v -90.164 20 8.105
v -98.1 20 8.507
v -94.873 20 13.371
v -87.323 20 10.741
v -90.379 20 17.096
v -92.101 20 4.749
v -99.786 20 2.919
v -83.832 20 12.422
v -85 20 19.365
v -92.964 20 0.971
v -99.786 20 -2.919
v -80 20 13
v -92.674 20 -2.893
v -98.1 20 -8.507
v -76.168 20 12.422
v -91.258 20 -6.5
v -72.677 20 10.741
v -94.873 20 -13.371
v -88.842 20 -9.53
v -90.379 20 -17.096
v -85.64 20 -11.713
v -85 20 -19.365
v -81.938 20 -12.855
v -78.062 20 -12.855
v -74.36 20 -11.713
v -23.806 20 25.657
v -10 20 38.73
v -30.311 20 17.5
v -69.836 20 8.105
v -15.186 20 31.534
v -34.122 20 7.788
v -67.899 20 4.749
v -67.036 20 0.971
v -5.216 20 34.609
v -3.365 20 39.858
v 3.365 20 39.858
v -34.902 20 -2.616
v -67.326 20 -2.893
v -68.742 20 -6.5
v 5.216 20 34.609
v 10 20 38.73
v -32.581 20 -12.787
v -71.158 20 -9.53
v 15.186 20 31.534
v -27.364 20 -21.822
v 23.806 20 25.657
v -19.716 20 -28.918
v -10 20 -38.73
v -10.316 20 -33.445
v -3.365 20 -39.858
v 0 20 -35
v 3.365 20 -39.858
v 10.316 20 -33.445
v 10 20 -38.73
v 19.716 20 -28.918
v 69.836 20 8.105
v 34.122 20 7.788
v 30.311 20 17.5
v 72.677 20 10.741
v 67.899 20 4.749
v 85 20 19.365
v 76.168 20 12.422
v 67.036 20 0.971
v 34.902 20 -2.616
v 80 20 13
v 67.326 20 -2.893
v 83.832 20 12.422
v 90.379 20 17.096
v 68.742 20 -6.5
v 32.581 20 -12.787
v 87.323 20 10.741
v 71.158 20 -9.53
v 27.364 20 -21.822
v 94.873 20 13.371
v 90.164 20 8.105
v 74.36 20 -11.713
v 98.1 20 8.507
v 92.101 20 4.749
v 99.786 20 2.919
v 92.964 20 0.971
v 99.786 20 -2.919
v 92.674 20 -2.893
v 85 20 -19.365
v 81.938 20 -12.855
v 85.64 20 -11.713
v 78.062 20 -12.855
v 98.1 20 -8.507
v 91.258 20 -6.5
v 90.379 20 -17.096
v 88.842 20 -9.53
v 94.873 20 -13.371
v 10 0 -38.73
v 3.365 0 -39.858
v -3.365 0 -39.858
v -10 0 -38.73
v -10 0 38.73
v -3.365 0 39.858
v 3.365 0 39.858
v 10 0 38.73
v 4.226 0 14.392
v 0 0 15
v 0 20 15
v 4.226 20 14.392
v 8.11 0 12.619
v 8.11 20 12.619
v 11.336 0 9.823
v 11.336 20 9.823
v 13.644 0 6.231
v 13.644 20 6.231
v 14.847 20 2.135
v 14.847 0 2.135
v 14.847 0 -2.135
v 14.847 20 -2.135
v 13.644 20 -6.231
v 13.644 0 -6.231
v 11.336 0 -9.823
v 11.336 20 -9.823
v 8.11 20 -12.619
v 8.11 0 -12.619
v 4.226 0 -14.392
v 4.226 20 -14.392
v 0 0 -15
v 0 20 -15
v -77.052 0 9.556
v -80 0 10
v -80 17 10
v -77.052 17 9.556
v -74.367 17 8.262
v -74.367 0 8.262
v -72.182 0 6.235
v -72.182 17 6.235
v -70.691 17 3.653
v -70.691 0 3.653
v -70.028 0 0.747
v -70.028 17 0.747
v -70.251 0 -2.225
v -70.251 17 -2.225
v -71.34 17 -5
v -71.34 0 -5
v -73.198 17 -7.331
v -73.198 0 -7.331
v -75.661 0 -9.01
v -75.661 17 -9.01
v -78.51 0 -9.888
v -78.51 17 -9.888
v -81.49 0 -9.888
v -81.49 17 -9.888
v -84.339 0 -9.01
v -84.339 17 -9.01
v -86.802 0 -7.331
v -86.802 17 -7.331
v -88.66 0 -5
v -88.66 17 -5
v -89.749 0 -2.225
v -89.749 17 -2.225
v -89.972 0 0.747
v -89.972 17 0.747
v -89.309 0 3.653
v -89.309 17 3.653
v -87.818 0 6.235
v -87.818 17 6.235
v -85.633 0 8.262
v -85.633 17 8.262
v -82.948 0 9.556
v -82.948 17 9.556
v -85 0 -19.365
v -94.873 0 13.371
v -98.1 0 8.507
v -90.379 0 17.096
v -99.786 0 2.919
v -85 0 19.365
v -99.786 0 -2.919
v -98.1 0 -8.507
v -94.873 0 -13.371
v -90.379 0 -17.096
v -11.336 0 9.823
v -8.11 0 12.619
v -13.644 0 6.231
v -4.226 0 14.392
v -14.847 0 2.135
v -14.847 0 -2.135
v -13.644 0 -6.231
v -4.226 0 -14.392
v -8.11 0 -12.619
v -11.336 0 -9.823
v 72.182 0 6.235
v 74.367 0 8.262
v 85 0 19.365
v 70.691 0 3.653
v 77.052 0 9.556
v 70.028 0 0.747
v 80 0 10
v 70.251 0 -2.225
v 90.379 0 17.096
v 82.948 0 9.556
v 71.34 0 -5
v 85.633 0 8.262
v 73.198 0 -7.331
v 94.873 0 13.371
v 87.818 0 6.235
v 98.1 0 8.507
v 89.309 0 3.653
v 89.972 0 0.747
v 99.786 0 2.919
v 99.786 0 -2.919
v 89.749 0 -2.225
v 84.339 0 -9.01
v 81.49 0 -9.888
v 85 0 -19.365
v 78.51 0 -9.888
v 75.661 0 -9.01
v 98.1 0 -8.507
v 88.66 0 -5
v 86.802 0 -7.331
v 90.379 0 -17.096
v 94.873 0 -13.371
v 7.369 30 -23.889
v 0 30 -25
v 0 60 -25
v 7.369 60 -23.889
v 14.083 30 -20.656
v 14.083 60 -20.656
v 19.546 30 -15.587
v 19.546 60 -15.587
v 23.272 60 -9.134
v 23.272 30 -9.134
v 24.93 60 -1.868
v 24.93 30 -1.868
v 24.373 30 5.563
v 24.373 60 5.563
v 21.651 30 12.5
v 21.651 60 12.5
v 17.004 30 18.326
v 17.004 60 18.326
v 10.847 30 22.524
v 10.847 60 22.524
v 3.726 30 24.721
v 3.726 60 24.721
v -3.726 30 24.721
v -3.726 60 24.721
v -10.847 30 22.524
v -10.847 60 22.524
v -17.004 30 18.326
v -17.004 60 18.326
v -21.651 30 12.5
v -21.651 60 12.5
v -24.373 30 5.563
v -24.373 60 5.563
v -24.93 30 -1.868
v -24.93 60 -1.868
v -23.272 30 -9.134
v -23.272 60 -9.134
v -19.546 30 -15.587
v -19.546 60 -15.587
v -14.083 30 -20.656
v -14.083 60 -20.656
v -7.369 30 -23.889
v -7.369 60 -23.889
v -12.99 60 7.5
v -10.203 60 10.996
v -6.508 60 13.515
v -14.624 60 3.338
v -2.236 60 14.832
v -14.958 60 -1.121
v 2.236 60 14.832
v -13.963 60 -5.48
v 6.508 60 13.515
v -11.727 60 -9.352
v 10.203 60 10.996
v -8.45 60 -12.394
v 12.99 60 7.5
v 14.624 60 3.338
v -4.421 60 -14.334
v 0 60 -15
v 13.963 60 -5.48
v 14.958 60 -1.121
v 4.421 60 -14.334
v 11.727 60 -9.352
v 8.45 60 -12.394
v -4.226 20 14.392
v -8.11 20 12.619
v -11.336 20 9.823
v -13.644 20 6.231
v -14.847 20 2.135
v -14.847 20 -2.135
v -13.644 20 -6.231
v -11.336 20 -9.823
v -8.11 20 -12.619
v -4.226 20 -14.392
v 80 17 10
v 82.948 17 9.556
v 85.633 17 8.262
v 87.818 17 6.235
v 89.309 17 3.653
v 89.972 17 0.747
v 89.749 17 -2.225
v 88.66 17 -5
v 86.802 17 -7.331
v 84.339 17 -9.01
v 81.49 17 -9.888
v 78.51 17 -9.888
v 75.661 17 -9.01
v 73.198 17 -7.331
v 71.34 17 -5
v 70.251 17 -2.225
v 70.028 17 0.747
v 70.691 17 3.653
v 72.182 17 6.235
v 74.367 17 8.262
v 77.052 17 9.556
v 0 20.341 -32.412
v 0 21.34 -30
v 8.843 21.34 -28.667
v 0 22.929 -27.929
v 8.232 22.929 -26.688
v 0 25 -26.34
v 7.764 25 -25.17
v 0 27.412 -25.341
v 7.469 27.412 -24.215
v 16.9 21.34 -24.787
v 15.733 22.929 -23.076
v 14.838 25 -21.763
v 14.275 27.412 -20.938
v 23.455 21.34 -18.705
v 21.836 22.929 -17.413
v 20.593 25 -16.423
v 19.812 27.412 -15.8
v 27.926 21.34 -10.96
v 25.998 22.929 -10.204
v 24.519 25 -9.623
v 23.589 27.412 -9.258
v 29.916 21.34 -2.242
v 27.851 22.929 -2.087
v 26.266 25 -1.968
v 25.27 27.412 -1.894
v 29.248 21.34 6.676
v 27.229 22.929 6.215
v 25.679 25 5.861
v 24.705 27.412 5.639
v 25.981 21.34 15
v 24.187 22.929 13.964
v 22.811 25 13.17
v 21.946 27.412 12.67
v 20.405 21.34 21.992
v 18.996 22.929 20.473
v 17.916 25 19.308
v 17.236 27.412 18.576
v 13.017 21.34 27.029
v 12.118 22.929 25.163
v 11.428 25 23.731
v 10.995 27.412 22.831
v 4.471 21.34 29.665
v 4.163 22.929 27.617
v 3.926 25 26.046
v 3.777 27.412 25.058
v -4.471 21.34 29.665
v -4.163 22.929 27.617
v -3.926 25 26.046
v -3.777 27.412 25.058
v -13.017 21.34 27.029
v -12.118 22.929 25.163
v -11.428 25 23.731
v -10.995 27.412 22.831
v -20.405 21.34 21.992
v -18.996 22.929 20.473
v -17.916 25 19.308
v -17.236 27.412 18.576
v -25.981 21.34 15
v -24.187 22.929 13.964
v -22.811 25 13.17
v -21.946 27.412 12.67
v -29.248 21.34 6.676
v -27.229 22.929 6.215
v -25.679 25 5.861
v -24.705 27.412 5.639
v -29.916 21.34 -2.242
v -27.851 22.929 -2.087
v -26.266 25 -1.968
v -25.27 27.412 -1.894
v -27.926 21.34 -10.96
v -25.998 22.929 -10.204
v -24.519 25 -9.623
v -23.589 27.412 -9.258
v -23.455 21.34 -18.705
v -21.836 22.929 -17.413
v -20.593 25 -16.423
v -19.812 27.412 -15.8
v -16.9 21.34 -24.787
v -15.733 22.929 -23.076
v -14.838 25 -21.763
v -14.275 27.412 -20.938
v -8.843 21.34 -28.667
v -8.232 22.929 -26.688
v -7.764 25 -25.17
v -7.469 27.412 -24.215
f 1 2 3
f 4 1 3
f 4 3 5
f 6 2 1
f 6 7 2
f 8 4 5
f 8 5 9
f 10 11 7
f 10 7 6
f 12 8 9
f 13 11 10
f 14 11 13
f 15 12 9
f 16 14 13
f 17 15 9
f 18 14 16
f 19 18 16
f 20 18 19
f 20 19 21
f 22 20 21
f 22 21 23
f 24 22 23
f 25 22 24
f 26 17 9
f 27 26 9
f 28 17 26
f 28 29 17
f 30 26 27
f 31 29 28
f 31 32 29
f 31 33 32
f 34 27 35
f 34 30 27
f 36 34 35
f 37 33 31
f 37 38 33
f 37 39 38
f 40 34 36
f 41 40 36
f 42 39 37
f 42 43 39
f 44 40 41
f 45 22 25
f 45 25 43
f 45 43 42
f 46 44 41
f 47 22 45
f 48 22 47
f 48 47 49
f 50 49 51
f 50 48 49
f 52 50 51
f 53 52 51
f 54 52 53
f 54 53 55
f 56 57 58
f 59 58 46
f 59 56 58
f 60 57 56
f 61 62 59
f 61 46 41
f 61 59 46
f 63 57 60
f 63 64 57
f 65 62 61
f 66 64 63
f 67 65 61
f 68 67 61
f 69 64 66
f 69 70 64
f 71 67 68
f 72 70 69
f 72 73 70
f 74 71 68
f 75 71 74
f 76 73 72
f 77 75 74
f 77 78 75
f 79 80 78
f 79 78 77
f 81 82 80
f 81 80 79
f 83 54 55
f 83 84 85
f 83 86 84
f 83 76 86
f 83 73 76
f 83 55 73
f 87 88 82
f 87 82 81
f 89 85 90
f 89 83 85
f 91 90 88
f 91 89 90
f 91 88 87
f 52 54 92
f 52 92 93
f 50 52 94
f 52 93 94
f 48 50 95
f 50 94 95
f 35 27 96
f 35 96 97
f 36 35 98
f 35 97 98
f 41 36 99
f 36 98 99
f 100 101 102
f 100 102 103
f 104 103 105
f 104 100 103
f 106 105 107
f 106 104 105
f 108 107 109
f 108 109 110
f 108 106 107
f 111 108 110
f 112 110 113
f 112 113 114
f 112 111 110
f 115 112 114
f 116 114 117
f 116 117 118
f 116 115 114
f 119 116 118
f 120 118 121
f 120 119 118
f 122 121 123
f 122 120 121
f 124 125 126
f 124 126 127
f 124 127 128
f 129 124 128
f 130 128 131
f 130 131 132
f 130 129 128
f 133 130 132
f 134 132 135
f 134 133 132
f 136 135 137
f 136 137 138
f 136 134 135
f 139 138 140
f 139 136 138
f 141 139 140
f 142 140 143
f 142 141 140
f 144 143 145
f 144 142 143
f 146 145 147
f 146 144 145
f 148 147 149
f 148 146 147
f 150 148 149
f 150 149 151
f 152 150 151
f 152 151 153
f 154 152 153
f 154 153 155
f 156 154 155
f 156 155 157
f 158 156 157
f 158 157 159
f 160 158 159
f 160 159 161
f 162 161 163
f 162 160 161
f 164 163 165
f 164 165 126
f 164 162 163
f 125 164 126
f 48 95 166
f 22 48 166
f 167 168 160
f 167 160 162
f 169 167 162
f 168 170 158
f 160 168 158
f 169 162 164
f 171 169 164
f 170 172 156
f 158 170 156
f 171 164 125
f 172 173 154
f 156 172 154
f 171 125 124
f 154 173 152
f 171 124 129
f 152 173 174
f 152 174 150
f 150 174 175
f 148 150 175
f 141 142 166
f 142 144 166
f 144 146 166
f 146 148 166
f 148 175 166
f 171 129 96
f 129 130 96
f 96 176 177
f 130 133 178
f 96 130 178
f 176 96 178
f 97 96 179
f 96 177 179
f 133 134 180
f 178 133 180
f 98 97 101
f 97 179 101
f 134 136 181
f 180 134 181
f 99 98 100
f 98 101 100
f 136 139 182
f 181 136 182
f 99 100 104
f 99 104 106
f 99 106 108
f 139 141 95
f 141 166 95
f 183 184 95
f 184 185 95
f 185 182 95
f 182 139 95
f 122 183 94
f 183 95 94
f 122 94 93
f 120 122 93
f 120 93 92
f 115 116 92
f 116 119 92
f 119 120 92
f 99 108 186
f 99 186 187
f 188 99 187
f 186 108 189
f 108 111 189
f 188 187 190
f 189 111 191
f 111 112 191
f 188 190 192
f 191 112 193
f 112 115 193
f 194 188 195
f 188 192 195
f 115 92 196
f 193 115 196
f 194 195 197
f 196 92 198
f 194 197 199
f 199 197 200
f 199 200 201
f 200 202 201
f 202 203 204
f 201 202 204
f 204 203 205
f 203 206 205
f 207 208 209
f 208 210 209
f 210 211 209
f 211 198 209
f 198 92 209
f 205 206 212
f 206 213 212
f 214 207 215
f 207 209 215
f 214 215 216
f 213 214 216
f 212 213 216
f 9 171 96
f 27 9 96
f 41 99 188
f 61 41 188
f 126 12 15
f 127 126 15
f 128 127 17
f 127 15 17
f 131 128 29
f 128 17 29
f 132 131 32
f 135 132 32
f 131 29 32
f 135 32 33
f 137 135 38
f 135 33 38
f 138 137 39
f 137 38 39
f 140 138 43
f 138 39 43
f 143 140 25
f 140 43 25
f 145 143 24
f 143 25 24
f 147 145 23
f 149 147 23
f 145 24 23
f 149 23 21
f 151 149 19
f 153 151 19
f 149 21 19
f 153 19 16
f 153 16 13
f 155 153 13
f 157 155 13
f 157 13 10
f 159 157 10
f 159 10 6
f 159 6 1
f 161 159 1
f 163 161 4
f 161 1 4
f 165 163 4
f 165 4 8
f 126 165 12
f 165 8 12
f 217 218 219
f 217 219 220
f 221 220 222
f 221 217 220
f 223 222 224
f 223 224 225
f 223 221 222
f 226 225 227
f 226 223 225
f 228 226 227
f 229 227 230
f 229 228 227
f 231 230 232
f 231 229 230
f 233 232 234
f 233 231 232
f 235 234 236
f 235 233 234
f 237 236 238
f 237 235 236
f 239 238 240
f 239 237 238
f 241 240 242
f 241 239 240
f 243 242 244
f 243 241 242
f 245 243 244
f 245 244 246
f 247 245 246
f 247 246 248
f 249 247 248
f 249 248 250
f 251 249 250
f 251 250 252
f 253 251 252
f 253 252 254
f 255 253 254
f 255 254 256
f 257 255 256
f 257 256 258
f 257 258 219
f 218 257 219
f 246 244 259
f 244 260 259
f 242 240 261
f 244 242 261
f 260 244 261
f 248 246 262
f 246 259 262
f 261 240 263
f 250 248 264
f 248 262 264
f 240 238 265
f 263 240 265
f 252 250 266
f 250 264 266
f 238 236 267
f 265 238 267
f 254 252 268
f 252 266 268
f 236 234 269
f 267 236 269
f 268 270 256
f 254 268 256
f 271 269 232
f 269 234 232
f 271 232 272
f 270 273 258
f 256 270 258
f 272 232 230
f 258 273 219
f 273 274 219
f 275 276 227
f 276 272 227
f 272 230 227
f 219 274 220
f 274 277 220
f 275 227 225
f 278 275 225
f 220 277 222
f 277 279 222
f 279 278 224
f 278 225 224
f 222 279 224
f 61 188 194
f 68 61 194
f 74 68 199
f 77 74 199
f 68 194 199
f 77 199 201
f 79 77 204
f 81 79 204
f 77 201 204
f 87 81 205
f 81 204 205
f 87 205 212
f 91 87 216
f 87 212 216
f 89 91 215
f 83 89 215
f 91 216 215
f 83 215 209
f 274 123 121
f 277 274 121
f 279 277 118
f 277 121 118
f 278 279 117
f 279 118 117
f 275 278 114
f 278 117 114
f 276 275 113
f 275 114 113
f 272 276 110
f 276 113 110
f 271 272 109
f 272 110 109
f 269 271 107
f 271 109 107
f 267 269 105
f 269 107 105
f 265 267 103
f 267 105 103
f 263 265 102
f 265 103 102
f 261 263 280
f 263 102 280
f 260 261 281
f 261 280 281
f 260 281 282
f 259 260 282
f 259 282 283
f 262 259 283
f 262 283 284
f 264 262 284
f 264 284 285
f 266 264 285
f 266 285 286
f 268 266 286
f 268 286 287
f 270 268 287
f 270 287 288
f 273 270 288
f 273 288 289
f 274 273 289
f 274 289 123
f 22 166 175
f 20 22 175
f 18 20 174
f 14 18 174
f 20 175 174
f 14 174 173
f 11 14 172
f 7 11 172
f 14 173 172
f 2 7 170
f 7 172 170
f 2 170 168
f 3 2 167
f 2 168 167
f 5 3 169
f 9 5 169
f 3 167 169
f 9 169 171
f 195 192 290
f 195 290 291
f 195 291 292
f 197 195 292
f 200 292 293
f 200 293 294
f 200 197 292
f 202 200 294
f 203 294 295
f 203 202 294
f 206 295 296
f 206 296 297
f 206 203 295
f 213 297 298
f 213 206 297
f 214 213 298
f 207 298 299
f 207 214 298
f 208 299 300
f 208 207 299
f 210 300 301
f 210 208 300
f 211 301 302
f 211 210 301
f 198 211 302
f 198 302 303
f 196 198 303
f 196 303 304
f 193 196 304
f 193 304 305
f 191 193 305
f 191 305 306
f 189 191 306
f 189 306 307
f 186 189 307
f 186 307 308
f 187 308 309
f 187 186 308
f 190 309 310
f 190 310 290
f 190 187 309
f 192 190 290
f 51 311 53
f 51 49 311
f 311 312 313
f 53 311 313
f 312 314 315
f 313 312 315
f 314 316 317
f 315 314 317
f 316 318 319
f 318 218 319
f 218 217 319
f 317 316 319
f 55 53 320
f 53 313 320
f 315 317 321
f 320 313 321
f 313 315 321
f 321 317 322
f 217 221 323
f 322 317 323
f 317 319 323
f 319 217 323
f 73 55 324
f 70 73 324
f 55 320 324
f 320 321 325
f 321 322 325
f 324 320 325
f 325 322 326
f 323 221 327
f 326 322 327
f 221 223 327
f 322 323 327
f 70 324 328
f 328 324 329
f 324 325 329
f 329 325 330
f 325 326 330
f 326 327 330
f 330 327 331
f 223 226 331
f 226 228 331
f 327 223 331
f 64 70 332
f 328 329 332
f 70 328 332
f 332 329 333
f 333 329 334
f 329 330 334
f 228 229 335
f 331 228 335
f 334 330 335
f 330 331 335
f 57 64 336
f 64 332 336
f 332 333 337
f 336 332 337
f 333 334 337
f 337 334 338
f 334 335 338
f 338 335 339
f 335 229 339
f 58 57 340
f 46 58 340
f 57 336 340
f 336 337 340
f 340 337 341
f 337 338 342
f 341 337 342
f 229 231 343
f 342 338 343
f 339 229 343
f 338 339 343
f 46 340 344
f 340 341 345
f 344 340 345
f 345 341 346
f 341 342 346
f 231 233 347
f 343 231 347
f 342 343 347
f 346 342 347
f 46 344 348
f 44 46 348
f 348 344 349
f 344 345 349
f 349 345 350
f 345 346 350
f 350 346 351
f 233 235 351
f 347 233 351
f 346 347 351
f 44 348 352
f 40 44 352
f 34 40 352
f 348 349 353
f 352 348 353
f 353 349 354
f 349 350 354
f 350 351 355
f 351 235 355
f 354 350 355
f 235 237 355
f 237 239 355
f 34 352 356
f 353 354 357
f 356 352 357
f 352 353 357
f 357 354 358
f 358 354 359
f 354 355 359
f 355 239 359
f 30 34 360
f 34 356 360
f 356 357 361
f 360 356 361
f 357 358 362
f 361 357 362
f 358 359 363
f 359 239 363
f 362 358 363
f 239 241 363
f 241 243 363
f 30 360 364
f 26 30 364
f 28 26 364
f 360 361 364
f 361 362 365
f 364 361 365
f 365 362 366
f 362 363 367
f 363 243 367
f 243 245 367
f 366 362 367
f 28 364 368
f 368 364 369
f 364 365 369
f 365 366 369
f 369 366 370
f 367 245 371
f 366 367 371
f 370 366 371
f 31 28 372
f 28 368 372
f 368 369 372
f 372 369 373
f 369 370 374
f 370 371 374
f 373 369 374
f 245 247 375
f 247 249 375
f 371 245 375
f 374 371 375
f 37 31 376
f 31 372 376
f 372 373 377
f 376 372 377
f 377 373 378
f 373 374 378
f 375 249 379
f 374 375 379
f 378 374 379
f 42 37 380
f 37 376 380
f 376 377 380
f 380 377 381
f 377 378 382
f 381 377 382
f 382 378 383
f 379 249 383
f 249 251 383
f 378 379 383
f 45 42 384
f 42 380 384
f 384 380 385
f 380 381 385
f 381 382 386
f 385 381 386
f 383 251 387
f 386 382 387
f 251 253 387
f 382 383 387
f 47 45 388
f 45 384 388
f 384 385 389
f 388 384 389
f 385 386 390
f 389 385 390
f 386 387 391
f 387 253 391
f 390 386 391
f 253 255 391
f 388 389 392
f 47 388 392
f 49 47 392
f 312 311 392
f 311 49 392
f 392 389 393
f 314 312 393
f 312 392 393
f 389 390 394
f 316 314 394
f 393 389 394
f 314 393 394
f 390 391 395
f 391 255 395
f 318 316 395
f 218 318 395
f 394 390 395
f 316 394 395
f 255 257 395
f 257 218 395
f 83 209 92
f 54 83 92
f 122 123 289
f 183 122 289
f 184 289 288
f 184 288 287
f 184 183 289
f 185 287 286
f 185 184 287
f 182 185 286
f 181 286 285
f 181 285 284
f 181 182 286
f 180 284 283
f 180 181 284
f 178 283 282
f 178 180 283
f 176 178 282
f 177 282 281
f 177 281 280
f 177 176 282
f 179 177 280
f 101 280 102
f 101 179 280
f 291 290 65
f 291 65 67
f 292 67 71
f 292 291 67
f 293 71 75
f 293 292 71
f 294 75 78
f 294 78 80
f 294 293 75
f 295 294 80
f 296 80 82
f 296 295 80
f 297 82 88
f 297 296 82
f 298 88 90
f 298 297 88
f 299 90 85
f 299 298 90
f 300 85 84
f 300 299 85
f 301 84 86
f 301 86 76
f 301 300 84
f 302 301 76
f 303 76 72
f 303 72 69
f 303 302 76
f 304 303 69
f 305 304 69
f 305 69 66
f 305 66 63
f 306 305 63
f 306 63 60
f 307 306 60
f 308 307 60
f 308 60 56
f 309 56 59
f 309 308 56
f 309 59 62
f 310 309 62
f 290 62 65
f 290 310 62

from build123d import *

# Parameters (mm, degrees)
SKETCH5_R            = 10
SKETCH5_R_2          = 40
SKETCH5_R_3          = 25
SKETCH5_R_4          = 15
BOSS_EXTRUDE11_DEPTH = 20
SKETCH11_R           = 25
SKETCH11_R_2         = 15
BOSS_EXTRUDE12_DEPTH = 60
CHAMFER3_SIZE        = 3
FILLET2_R            = 10
CHAMFER4_SIZE        = 3


with BuildPart() as part:
    # Sketch5 → Boss-Extrude11 (new body)
    # profile 1 of 4: a face of its own
    with BuildSketch(Plane(origin=(0, 0, 0), x_dir=(1, 0, 0), z_dir=(0, 1, 0))):
        with BuildLine():
            ThreePointArc((-10, -38.729833462), (-40, 0), (-10, 38.729833462))
            Line((-10, 38.729833462), (-85, 19.364916731))
            ThreePointArc((-85, 19.364916731), (-100, 0), (-85, -19.364916731))
            Line((-85, -19.364916731), (-10, -38.729833462))
        make_face()
        with Locations(Location((-80, 0, 0), (0, 0, 270))):
            Circle(SKETCH5_R, mode=Mode.SUBTRACT)
    # profile 2 of 4: a face of its own
    with BuildSketch(Plane(origin=(0, 0, 0), x_dir=(1, 0, 0), z_dir=(0, 1, 0))):
        with BuildLine():
            Line((85, 19.364916731), (10, 38.729833462))
            ThreePointArc((10, 38.729833462), (31.622776602, 24.494897428), (40, 0))
            ThreePointArc((40, 0), (31.622776602, -24.494897428), (10, -38.729833462))
            Line((10, -38.729833462), (85, -19.364916731))
            ThreePointArc((85, -19.364916731), (100, 0), (85, 19.364916731))
        make_face()
        with Locations(Location((80, 0, 0), (0, 0, 270))):
            Circle(SKETCH5_R, mode=Mode.SUBTRACT)
    # profile 3 of 4: a face of its own
    with BuildSketch(Plane(origin=(0, 0, 0), x_dir=(1, 0, 0), z_dir=(0, 1, 0))):
        Circle(SKETCH5_R_2)
        Circle(SKETCH5_R_3, mode=Mode.SUBTRACT)
    # profile 4 of 4: a face of its own
    with BuildSketch(Plane(origin=(0, 0, 0), x_dir=(1, 0, 0), z_dir=(0, 1, 0))):
        Circle(SKETCH5_R_3)
        with Locations(Location((0, 0, 0), (0, 0, 270))):
            Circle(SKETCH5_R_4, mode=Mode.SUBTRACT)
    extrude(amount=BOSS_EXTRUDE11_DEPTH)

    # Sketch11 → Boss-Extrude12 (add)
    with BuildSketch(Plane.XZ):
        with Locations(Location((0, 0, 0), (0, 0, 270))):
            Circle(SKETCH11_R)
        with Locations(Location((0, 0, 0), (0, 0, 270))):
            Circle(SKETCH11_R_2, mode=Mode.SUBTRACT)
    extrude(amount=-BOSS_EXTRUDE12_DEPTH)

    # Chamfer3
    chamfer3_edges = [part.edges().sort_by_distance(p)[0] for p in [
        (-80, 20, -10),
    ]]
    chamfer(chamfer3_edges, length=CHAMFER3_SIZE)

    # Fillet2
    fillet2_edges = [part.edges().sort_by_distance(p)[0] for p in [
        (0, 20, 25),
    ]]
    fillet(fillet2_edges, radius=FILLET2_R)

    # Chamfer4
    chamfer4_edges = [part.edges().sort_by_distance(p)[0] for p in [
        (80, 20, -10),
    ]]
    chamfer(chamfer4_edges, length=CHAMFER4_SIZE)


solid = part.part
